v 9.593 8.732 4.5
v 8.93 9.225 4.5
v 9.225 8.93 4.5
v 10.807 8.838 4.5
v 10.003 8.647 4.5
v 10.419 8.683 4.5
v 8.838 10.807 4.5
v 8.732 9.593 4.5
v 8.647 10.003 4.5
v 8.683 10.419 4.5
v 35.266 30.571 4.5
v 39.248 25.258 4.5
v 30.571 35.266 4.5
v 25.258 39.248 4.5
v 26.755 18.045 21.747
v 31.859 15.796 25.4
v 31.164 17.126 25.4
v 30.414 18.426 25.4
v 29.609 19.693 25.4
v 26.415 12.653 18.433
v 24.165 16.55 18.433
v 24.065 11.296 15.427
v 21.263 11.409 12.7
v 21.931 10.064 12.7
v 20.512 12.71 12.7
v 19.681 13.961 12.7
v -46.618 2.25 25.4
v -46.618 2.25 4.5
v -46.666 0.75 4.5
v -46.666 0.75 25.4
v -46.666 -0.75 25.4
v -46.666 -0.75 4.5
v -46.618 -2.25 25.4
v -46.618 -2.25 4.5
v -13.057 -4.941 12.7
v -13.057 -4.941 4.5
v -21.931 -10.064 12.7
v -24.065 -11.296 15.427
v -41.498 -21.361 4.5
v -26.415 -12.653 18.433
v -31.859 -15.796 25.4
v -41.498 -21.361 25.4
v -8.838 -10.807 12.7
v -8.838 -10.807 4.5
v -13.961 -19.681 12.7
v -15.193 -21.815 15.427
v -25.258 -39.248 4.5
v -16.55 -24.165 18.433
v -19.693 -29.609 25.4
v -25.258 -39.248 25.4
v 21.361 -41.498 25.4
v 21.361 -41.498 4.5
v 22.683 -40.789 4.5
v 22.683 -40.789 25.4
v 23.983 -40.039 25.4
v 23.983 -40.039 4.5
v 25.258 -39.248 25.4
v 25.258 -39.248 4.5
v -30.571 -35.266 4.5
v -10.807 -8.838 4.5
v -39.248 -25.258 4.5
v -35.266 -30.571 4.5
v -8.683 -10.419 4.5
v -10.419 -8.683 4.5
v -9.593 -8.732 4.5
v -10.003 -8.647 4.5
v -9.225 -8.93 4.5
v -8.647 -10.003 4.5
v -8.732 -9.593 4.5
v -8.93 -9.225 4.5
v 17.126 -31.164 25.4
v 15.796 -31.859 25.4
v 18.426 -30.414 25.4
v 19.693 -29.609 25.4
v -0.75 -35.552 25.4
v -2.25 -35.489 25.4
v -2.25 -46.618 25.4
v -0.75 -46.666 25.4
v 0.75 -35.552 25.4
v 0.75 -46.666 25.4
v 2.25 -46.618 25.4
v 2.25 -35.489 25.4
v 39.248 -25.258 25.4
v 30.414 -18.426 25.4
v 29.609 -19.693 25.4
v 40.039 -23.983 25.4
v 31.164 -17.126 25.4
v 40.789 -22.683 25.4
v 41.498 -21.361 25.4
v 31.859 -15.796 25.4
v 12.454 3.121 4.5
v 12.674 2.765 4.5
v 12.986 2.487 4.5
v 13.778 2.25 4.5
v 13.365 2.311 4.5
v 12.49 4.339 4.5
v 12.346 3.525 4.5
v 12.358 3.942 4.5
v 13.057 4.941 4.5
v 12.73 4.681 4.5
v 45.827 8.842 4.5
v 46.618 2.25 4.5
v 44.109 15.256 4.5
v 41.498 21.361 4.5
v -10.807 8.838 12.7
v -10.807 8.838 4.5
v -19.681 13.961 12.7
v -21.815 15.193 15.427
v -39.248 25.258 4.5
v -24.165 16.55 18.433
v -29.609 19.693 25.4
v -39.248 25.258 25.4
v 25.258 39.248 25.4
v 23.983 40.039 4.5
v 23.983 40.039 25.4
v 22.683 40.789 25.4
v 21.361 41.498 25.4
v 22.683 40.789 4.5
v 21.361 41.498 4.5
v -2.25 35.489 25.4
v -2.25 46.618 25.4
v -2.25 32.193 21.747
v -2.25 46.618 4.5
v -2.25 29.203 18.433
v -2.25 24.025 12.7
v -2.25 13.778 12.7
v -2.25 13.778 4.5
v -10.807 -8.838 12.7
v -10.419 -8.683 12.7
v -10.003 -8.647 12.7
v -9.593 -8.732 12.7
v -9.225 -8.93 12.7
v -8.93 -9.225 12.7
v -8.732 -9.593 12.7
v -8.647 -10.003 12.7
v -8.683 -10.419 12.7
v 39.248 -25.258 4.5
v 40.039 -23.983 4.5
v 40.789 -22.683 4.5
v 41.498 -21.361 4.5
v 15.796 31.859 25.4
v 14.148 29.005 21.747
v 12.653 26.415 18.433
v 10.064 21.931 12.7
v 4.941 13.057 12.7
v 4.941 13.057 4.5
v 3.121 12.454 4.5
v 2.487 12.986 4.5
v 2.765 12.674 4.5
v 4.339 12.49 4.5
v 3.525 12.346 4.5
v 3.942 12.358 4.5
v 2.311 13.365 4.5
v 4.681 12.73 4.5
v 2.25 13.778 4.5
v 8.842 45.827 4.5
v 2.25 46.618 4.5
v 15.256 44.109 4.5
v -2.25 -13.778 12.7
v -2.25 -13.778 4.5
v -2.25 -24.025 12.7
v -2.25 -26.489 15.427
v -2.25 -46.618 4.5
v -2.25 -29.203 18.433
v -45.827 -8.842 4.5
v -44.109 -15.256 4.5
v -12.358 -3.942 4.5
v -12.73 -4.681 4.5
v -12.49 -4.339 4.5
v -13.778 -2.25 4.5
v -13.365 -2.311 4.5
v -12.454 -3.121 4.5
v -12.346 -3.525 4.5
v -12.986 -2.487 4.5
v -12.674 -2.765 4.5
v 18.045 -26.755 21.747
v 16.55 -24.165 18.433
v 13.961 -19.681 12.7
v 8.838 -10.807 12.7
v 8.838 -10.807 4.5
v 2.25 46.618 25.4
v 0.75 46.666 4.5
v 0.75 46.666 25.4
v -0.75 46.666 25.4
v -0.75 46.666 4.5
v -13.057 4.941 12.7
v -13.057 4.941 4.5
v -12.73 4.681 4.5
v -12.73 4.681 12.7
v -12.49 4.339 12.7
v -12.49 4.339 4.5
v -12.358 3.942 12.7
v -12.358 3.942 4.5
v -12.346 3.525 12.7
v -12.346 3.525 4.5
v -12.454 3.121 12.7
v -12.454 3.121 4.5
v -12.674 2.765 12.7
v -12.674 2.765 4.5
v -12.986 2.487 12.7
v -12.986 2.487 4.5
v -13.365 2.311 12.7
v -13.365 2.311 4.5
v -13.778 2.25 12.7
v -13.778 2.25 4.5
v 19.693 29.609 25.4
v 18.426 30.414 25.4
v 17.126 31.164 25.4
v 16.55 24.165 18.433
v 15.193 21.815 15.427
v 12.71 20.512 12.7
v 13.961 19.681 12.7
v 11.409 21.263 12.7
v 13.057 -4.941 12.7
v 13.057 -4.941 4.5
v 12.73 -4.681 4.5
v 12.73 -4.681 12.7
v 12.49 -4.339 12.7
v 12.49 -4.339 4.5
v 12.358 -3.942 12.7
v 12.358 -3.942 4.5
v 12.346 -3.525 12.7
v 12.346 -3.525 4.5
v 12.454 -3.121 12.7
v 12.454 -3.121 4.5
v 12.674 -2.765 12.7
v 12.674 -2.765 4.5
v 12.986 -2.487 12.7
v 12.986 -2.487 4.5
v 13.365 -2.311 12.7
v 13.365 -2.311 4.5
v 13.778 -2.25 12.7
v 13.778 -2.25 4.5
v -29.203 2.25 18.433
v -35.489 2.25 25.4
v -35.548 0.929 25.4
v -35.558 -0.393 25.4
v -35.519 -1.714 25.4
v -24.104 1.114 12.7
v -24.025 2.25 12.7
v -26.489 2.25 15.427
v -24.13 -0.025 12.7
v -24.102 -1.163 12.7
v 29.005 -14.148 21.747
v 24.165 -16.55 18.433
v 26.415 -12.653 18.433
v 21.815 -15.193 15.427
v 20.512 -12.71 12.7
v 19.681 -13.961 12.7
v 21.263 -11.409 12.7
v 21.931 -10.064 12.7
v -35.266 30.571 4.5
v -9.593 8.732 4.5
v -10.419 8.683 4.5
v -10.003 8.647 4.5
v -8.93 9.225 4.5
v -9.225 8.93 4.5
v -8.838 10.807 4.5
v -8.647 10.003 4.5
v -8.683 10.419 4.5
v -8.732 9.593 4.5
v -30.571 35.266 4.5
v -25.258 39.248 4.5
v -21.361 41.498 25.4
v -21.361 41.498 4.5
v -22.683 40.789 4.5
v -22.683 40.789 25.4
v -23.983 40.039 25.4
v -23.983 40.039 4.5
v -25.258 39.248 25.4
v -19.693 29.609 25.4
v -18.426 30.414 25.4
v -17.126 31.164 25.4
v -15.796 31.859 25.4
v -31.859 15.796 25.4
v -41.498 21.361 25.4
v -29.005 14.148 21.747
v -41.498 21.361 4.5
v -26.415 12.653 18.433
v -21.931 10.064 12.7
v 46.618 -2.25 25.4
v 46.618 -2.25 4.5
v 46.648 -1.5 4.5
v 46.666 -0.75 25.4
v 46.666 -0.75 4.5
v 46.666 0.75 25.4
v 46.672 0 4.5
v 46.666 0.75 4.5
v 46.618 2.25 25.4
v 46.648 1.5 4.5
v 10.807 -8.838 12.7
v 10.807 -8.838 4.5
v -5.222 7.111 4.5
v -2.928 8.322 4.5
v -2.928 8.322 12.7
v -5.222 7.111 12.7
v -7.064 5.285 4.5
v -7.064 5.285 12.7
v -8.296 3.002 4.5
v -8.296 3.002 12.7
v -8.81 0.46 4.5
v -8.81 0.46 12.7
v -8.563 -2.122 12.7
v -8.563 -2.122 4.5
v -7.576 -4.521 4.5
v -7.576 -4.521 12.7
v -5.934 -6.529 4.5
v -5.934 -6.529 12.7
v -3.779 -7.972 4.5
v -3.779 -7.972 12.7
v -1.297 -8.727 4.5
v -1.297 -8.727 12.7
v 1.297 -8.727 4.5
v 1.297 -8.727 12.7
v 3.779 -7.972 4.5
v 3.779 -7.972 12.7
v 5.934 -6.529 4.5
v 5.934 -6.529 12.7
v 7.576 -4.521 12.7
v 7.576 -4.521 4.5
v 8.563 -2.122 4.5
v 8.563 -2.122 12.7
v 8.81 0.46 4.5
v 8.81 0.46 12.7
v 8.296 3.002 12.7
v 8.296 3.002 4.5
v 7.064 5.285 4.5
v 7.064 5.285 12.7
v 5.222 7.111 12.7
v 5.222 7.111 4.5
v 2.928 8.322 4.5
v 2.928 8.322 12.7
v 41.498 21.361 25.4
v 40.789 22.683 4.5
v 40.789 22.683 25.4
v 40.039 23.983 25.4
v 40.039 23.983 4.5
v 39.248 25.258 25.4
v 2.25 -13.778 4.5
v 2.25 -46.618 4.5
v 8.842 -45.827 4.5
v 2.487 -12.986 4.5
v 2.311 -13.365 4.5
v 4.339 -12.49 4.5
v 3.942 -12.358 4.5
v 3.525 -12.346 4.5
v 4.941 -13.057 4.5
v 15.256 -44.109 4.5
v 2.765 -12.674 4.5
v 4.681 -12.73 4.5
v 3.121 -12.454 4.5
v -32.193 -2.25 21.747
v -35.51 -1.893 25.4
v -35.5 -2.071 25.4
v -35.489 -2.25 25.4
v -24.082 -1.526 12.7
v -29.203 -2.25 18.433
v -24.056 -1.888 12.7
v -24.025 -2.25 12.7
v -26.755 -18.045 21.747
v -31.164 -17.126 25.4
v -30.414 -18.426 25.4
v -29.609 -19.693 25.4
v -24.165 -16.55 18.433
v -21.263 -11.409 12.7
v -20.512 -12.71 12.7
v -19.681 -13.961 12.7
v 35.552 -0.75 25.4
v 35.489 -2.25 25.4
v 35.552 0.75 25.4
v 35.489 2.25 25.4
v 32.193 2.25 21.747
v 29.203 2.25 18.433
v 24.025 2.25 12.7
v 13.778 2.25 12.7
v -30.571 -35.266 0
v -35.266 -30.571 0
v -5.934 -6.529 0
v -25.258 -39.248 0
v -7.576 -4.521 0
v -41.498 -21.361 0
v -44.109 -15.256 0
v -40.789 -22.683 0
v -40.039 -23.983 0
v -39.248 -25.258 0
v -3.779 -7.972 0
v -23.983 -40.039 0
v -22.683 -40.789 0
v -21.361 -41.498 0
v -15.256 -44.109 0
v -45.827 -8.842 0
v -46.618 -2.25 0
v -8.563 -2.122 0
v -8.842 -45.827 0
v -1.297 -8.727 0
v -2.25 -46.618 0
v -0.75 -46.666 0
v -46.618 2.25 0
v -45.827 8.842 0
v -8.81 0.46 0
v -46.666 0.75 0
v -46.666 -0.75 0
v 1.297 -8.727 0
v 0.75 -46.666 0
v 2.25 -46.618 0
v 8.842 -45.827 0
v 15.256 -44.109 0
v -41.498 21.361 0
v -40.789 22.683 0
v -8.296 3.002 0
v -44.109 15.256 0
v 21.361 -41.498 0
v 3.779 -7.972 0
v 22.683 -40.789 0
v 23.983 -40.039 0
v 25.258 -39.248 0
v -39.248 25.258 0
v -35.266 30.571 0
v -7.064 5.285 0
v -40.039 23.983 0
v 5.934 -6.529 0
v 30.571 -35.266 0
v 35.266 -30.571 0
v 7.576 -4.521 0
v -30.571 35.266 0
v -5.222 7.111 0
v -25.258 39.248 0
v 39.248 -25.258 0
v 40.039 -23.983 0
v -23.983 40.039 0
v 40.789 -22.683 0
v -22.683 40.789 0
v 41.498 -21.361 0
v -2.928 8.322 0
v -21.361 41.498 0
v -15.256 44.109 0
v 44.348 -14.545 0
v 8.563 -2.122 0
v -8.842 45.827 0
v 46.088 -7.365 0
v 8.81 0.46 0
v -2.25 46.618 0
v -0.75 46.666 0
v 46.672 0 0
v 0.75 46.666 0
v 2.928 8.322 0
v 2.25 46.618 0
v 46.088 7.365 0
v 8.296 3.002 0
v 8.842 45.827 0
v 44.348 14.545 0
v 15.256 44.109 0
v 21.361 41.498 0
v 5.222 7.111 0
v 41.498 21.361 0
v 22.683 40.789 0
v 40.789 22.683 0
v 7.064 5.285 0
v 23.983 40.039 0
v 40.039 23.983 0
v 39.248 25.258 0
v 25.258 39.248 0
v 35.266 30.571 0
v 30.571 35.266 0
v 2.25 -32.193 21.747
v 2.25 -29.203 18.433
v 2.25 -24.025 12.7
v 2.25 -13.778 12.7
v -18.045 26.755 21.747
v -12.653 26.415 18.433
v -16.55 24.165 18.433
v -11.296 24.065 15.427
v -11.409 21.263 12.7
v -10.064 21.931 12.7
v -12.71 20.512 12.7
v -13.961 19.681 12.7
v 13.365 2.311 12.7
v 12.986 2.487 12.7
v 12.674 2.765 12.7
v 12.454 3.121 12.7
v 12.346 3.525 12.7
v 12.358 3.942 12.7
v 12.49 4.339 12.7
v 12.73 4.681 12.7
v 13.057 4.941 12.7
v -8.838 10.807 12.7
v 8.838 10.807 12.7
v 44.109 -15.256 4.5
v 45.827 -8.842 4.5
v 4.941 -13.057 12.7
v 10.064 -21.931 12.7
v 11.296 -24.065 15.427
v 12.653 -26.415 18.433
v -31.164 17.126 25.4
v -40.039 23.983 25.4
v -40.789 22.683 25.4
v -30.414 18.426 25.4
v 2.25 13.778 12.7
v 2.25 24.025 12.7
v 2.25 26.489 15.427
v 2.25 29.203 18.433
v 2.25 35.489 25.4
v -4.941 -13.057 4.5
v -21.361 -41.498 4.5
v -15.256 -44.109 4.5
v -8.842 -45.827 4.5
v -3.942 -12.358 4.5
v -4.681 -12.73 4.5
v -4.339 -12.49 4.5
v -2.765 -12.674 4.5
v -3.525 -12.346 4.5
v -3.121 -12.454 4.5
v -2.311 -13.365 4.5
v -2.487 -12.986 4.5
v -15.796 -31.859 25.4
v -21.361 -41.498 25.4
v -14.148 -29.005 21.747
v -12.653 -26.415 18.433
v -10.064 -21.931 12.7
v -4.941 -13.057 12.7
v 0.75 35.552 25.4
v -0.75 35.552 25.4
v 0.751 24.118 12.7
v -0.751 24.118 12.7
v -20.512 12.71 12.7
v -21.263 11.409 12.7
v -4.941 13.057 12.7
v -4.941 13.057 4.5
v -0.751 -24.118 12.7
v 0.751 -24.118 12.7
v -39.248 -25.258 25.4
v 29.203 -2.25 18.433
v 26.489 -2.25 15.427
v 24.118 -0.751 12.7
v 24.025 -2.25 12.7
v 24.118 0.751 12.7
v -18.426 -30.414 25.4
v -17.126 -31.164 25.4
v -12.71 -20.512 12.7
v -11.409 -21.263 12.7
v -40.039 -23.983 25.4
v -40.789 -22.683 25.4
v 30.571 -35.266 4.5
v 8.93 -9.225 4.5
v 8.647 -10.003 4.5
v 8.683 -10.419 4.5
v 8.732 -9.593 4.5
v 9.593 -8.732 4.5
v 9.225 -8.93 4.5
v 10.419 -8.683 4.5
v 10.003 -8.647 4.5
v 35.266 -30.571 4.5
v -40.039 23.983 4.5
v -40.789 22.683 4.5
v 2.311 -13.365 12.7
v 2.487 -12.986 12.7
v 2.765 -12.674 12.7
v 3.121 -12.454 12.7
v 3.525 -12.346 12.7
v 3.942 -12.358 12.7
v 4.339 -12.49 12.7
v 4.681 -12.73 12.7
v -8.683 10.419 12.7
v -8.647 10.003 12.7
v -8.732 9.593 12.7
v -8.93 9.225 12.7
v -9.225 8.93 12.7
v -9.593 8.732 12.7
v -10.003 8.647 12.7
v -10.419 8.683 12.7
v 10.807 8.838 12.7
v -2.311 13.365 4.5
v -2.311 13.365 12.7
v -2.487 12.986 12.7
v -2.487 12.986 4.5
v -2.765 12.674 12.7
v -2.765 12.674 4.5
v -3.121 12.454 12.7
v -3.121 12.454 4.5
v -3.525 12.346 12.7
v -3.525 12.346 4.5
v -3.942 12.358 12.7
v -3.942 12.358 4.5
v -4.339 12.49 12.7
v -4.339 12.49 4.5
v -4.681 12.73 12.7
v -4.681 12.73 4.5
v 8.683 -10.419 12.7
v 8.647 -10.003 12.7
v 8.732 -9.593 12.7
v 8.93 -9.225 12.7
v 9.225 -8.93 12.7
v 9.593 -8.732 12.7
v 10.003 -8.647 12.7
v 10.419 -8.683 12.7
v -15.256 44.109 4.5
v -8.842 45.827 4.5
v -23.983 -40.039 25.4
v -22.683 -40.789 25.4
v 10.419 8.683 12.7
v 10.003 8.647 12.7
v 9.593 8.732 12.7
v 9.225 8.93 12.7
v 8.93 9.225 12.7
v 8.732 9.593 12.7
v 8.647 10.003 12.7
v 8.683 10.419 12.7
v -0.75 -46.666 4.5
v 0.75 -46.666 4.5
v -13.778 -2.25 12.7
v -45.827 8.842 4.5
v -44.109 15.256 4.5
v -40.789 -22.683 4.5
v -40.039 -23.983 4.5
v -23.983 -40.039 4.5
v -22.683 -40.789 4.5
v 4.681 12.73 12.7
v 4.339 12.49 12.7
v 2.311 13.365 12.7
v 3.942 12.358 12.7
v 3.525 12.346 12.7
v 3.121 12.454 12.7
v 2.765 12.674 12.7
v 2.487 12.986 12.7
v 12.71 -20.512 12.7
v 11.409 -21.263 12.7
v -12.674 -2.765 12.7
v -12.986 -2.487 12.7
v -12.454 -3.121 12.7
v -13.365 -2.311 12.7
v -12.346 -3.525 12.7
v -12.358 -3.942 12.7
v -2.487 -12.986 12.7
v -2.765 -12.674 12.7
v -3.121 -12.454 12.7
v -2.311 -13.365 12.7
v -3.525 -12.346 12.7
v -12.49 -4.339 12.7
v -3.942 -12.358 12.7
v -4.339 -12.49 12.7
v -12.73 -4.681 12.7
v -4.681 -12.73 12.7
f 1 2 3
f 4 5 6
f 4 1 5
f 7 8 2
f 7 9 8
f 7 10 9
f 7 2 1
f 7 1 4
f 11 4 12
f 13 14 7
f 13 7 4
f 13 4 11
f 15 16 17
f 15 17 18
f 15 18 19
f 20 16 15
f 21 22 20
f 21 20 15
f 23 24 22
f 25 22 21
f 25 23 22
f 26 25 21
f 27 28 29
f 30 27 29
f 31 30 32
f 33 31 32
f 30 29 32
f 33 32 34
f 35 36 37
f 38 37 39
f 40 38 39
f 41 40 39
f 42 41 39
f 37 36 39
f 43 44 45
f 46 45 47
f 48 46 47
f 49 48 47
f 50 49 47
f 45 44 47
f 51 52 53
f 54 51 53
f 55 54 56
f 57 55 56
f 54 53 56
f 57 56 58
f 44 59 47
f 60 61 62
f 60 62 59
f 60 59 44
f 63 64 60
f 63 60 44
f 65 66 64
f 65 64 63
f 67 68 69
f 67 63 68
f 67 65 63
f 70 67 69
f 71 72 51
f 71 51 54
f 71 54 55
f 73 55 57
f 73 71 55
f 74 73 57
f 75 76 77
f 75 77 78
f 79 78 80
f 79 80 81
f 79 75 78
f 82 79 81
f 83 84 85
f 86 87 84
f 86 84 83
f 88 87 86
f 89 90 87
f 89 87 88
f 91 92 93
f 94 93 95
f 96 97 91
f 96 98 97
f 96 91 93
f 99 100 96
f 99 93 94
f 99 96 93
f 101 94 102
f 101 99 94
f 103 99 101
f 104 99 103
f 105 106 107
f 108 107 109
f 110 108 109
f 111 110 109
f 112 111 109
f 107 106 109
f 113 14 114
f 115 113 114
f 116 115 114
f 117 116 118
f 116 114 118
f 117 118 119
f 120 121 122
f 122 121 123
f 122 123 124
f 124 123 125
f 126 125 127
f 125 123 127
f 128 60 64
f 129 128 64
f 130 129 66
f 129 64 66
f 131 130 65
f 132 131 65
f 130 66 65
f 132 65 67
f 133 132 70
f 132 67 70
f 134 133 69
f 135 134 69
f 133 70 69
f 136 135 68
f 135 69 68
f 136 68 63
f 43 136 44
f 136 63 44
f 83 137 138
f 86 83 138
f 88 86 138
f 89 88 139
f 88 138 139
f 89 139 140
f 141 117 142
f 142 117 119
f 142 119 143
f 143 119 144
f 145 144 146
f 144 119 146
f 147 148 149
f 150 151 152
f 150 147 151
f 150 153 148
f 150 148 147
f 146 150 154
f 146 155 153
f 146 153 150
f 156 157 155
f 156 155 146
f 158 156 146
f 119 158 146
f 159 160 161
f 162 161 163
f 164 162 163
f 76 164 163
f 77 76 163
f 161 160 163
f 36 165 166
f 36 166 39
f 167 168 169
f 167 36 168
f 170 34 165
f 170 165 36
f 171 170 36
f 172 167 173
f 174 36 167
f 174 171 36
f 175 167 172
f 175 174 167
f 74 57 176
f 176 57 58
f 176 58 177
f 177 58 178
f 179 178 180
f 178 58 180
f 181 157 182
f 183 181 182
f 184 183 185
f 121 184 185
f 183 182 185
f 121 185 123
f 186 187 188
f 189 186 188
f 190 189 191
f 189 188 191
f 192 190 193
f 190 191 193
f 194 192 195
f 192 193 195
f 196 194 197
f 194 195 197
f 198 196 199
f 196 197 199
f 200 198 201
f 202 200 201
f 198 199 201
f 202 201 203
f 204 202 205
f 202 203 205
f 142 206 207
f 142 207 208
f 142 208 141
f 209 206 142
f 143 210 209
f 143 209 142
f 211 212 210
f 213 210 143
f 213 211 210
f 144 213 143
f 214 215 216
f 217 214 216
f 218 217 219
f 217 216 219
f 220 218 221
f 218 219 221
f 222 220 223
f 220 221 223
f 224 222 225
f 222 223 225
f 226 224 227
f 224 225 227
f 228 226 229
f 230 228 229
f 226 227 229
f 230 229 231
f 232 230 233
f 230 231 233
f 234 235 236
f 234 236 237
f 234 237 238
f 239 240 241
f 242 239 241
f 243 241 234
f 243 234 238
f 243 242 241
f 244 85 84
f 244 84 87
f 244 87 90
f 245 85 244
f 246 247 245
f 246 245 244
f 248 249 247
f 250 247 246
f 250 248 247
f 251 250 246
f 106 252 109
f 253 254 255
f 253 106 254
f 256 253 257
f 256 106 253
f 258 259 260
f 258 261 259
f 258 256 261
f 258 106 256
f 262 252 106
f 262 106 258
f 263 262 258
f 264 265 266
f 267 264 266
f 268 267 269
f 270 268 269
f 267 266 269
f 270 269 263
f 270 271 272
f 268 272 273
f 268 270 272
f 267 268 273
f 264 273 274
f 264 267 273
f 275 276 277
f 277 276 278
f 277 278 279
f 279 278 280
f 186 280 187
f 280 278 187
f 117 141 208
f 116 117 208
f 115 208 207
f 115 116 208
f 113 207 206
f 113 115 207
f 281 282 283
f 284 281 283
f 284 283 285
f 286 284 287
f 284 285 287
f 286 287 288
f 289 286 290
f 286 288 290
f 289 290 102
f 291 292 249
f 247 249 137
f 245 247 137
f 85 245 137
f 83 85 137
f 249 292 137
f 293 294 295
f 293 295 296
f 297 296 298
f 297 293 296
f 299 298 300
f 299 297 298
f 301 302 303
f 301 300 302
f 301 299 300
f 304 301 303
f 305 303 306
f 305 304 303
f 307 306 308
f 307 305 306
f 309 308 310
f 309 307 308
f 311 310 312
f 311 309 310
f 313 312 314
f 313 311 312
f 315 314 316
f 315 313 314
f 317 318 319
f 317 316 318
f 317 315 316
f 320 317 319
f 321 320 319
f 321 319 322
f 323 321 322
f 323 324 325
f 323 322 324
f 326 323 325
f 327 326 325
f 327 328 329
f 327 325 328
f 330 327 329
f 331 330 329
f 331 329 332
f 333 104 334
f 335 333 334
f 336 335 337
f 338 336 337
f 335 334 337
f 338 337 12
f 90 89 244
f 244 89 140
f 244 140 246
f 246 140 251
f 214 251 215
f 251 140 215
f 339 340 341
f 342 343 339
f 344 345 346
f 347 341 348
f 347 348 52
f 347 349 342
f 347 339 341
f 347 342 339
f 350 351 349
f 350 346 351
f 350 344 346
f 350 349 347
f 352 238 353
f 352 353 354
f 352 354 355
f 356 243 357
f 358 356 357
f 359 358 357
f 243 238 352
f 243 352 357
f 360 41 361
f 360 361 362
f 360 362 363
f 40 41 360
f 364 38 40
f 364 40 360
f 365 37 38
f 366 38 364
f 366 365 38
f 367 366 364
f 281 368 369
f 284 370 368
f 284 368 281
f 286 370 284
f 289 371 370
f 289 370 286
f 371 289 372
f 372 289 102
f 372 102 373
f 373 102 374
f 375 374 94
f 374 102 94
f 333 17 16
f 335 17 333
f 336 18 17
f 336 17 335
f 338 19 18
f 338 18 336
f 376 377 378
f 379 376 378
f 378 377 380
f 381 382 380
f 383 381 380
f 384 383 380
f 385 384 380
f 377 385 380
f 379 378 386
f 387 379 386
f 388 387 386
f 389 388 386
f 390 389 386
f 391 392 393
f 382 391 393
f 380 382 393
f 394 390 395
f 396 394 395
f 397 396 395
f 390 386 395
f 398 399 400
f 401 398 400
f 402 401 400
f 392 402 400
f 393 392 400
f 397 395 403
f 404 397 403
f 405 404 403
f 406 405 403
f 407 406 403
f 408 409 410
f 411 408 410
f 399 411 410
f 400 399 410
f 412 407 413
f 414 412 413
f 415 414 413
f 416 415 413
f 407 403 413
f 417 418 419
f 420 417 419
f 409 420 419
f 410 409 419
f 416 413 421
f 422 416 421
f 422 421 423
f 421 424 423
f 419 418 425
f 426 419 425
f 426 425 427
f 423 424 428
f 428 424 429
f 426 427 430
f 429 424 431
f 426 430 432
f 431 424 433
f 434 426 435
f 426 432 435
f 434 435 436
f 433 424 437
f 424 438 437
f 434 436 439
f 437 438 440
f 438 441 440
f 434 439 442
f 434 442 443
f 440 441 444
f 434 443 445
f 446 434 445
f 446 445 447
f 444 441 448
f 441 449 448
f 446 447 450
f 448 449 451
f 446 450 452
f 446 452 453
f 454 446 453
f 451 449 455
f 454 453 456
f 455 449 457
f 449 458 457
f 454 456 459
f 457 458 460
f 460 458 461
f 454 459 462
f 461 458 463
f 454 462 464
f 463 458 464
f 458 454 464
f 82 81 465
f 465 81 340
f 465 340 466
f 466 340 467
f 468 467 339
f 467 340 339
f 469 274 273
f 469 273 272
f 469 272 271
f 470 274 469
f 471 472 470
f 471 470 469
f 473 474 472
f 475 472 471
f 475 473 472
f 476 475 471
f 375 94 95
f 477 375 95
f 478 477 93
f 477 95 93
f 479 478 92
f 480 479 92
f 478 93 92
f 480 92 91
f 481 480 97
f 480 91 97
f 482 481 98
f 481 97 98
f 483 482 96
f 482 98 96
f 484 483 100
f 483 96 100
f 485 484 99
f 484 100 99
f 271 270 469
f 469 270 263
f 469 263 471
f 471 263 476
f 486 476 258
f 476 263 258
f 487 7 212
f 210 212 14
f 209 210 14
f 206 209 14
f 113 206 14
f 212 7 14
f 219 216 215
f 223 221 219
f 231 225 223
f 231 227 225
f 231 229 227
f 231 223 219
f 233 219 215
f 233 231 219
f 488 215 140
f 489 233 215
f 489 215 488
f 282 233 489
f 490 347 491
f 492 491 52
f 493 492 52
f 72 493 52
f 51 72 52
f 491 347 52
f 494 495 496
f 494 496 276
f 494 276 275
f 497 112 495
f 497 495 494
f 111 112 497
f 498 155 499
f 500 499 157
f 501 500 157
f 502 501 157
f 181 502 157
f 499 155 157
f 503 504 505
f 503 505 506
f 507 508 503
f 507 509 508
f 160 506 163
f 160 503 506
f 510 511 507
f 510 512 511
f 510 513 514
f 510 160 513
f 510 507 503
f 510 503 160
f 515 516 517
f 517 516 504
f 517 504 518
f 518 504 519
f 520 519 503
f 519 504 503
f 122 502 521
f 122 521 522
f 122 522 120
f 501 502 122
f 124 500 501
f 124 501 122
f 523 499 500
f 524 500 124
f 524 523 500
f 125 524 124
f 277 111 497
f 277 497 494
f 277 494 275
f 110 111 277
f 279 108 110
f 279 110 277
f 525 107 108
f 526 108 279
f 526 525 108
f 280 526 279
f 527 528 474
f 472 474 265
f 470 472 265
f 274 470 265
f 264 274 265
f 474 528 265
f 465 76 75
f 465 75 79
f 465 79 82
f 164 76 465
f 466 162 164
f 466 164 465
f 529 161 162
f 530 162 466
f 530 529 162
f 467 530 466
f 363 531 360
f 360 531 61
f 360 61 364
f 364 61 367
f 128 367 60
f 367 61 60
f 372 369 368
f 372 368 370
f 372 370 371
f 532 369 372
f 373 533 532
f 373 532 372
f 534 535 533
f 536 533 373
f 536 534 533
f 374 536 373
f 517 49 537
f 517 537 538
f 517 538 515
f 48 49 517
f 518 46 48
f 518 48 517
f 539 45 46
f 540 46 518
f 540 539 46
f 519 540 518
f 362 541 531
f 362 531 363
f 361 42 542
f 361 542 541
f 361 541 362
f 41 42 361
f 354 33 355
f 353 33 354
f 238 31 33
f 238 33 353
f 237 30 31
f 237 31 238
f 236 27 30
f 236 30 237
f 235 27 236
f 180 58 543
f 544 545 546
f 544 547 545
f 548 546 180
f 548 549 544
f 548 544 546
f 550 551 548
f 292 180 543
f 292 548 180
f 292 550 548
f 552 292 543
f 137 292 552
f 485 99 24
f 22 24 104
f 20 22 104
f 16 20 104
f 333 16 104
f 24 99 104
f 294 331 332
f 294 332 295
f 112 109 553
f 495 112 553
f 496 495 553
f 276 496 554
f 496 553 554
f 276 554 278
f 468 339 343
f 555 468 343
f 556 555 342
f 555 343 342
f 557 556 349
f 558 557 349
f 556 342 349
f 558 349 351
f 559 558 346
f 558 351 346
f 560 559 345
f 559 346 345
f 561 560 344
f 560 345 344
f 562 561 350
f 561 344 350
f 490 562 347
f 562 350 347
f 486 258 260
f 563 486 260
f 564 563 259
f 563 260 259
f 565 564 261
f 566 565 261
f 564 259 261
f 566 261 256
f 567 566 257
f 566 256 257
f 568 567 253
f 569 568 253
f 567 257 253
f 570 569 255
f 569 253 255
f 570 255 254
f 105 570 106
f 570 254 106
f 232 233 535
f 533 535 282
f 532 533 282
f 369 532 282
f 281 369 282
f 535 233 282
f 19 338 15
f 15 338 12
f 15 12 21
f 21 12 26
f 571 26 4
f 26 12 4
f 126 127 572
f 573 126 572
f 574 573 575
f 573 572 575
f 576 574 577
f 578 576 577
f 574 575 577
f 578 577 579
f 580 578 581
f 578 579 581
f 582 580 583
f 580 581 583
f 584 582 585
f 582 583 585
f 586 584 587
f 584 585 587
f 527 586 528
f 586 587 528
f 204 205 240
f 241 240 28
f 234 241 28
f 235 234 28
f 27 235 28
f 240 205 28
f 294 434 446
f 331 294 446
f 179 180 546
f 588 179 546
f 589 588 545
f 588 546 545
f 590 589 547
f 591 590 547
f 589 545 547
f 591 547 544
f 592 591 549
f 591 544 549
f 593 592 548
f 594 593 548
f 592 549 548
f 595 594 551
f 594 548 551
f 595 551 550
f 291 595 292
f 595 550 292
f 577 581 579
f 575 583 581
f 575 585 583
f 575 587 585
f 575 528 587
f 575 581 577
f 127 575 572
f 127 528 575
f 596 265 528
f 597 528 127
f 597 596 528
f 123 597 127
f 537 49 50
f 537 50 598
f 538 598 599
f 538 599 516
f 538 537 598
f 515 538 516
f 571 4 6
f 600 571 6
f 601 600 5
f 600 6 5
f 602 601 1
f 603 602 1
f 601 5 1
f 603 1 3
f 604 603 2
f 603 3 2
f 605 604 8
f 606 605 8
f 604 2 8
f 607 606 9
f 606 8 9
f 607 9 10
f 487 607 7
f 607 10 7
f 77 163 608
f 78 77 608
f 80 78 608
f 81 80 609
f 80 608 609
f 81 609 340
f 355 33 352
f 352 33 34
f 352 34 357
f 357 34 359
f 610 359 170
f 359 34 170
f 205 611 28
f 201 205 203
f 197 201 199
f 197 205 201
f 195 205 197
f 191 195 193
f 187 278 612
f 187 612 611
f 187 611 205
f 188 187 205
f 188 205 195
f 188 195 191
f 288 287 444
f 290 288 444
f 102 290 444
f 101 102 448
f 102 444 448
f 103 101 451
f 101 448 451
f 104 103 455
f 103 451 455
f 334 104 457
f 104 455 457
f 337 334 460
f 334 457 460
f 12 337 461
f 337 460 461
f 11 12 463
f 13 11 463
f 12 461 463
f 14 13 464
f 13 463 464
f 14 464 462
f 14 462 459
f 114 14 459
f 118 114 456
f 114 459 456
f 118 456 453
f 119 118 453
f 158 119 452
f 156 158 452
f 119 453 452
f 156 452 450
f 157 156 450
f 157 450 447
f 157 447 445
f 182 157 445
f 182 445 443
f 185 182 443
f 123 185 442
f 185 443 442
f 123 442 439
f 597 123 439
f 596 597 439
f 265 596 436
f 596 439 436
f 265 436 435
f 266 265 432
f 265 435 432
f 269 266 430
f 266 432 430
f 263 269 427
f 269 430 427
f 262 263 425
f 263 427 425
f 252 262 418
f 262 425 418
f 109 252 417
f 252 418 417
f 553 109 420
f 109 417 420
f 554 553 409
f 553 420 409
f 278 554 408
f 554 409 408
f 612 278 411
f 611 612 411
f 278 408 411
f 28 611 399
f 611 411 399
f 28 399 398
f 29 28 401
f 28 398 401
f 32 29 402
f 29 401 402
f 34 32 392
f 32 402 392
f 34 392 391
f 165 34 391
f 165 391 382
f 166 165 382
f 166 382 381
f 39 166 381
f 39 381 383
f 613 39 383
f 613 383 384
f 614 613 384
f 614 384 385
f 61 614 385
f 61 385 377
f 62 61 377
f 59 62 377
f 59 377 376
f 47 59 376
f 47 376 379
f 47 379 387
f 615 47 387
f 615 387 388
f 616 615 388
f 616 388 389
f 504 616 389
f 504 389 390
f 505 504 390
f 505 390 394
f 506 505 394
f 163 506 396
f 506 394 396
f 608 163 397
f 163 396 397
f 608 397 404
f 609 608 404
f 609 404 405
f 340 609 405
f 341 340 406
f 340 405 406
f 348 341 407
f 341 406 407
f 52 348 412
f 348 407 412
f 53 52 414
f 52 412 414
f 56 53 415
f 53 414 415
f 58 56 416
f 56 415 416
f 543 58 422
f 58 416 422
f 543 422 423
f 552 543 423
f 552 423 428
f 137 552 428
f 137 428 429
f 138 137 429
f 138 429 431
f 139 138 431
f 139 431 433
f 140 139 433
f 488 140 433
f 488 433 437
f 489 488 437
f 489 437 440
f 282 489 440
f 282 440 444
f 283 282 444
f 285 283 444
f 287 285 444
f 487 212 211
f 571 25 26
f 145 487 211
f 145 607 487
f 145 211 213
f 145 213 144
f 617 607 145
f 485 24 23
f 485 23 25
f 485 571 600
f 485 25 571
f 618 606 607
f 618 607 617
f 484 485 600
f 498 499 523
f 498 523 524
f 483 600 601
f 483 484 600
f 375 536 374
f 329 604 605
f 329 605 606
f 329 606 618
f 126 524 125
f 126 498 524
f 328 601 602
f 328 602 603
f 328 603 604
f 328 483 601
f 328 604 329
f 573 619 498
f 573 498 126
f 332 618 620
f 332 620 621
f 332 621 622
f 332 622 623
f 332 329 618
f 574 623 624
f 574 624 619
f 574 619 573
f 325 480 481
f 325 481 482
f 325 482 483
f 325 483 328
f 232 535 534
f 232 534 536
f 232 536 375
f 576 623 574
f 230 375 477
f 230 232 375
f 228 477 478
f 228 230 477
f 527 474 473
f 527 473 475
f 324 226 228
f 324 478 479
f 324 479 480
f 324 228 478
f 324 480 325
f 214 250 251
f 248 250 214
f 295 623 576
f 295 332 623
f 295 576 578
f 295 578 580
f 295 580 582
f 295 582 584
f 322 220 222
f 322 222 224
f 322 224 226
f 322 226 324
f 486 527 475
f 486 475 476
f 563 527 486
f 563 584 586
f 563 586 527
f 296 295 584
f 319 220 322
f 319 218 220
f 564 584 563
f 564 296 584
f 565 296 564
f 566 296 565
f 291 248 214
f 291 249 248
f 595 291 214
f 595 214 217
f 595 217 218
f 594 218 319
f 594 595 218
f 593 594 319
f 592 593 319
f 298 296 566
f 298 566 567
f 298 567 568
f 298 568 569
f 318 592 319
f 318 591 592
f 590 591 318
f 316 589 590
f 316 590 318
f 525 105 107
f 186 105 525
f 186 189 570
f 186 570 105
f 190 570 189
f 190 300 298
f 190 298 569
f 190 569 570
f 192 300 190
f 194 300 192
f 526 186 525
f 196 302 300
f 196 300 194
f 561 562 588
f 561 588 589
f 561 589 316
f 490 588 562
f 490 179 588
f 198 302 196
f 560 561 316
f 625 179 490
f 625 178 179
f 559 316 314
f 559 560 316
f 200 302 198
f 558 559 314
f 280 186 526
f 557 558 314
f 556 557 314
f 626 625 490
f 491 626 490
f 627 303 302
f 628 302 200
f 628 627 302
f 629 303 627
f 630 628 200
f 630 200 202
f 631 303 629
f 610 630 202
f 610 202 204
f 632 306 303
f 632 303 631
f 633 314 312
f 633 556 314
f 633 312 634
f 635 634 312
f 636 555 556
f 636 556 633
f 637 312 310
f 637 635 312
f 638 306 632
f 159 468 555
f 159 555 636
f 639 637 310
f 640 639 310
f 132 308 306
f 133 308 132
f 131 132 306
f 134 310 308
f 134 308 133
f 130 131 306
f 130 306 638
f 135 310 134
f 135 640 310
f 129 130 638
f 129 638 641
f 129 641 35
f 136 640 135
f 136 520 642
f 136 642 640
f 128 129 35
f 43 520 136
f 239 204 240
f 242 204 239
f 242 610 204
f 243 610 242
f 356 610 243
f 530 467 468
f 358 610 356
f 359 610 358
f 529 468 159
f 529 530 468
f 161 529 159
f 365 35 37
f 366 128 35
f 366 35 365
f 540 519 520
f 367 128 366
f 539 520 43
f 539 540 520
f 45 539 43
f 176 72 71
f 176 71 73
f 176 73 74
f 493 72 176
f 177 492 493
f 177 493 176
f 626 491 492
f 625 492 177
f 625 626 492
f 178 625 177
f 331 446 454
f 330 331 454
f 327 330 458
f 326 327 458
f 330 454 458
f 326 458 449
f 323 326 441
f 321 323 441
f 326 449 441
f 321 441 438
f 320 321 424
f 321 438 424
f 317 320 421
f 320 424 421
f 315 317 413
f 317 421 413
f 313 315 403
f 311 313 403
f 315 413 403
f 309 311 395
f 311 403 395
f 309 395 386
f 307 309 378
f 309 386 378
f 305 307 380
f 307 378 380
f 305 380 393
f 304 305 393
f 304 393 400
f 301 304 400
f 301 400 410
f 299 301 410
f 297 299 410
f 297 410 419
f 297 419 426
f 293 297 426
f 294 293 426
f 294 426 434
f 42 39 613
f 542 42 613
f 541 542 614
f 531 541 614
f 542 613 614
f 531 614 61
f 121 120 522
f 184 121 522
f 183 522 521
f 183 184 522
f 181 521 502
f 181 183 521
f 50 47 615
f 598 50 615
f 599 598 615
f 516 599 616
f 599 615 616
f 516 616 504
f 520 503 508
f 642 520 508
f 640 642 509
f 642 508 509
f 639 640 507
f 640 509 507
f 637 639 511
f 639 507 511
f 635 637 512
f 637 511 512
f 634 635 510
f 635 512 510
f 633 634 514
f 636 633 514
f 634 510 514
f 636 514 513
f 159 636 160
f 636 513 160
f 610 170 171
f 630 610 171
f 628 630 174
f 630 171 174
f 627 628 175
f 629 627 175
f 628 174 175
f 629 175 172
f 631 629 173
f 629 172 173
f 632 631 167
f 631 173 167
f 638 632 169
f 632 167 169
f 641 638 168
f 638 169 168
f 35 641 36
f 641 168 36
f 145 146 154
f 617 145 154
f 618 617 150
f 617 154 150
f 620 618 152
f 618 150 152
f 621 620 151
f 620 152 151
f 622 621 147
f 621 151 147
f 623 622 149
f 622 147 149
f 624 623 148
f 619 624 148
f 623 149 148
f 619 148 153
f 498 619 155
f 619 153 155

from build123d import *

# Parameters (mm, degrees)
SKETCH1_R           = 46.6725
BOSS_EXTRUDE1_DEPTH = 4.5
BOSS_EXTRUDE2_START = -4.5
BOSS_EXTRUDE2_DEPTH = 25.4


with BuildPart() as part:
    # Sketch1 → Boss-Extrude1 (new body)
    with BuildSketch(Plane.XY):
        Circle(SKETCH1_R)
        with BuildLine():
            Line((-2.927883194, 8.3225), (2.927883194, 8.3225))
            ThreePointArc((2.927883194, 8.3225), (0, -8.8225), (-2.927883194, 8.3225))
        make_face(mode=Mode.SUBTRACT)
    extrude(amount=BOSS_EXTRUDE1_DEPTH)

    # Sketch2 → Boss-Extrude2 (add)
    with BuildSketch(Plane.XY.offset(4.5).offset(BOSS_EXTRUDE2_START)):
        with BuildLine():
            Line((-2.25, 46.618234161), (-2.25, 13.778350254))
            ThreePointArc((-2.25, 13.778350254), (-3.318707206, 12.385583908), (-4.940617969, 13.057401343))
            Line((-4.940617969, 13.057401343), (-21.360559922, 41.497575063))
            ThreePointArc((-21.360559922, 41.497575063), (-23.33625, 40.419570658), (-25.257674239, 39.247575063))
            Line((-25.257674239, 39.247575063), (-8.837732286, 10.807401343))
            ThreePointArc((-8.837732286, 10.807401343), (-9.066876702, 9.066876702), (-10.807401343, 8.837732286))
            Line((-10.807401343, 8.837732286), (-39.247575063, 25.257674239))
            ThreePointArc((-39.247575063, 25.257674239), (-40.419570658, 23.33625), (-41.497575063, 21.360559922))
            Line((-41.497575063, 21.360559922), (-13.057401343, 4.940617969))
            ThreePointArc((-13.057401343, 4.940617969), (-12.385583908, 3.318707206), (-13.778350254, 2.25))
            Line((-13.778350254, 2.25), (-46.618234161, 2.25))
            ThreePointArc((-46.618234161, 2.25), (-46.6725, 0), (-46.618234161, -2.25))
            Line((-46.618234161, -2.25), (-13.778350254, -2.25))
            ThreePointArc((-13.778350254, -2.25), (-12.385583908, -3.318707206), (-13.057401343, -4.940617969))
            Line((-13.057401343, -4.940617969), (-41.497575063, -21.360559922))
            ThreePointArc((-41.497575063, -21.360559922), (-40.419570658, -23.33625), (-39.247575063, -25.257674239))
            Line((-39.247575063, -25.257674239), (-10.807401343, -8.837732286))
            ThreePointArc((-10.807401343, -8.837732286), (-9.066876702, -9.066876702), (-8.837732286, -10.807401343))
            Line((-8.837732286, -10.807401343), (-25.257674239, -39.247575063))
            ThreePointArc((-25.257674239, -39.247575063), (-23.33625, -40.419570658), (-21.360559922, -41.497575063))
            Line((-21.360559922, -41.497575063), (-4.940617969, -13.057401343))
            ThreePointArc((-4.940617969, -13.057401343), (-3.318707206, -12.385583908), (-2.25, -13.778350254))
            Line((-2.25, -13.778350254), (-2.25, -46.618234161))
            ThreePointArc((-2.25, -46.618234161), (0, -46.6725), (2.25, -46.618234161))
            Line((2.25, -46.618234161), (2.25, -13.778350254))
            ThreePointArc((2.25, -13.778350254), (3.318707206, -12.385583908), (4.940617969, -13.057401343))
            Line((4.940617969, -13.057401343), (21.360559922, -41.497575063))
            ThreePointArc((21.360559922, -41.497575063), (23.33625, -40.419570658), (25.257674239, -39.247575063))
            Line((25.257674239, -39.247575063), (8.837732286, -10.807401343))
            ThreePointArc((8.837732286, -10.807401343), (9.066876702, -9.066876702), (10.807401343, -8.837732286))
            Line((10.807401343, -8.837732286), (39.247575063, -25.257674239))
            ThreePointArc((39.247575063, -25.257674239), (40.419570658, -23.33625), (41.497575063, -21.360559922))
            Line((41.497575063, -21.360559922), (13.057401343, -4.940617969))
            ThreePointArc((13.057401343, -4.940617969), (12.385583908, -3.318707206), (13.778350254, -2.25))
            Line((13.778350254, -2.25), (46.618234161, -2.25))
            ThreePointArc((46.618234161, -2.25), (46.6725, 0), (46.618234161, 2.25))
            Line((46.618234161, 2.25), (13.778350254, 2.25))
            ThreePointArc((13.778350254, 2.25), (12.385583908, 3.318707206), (13.057401343, 4.940617969))
            Line((13.057401343, 4.940617969), (41.497575063, 21.360559922))
            ThreePointArc((41.497575063, 21.360559922), (40.419570658, 23.33625), (39.247575063, 25.257674239))
            Line((39.247575063, 25.257674239), (10.807401343, 8.837732286))
            ThreePointArc((10.807401343, 8.837732286), (9.066876702, 9.066876702), (8.837732286, 10.807401343))
            Line((8.837732286, 10.807401343), (25.257674239, 39.247575063))
            ThreePointArc((25.257674239, 39.247575063), (23.33625, 40.419570658), (21.360559922, 41.497575063))
            Line((21.360559922, 41.497575063), (4.940617969, 13.057401343))
            ThreePointArc((4.940617969, 13.057401343), (3.318707206, 12.385583908), (2.25, 13.778350254))
            Line((2.25, 13.778350254), (2.25, 46.618234161))
            ThreePointArc((2.25, 46.618234161), (0, 46.6725), (-2.25, 46.618234161))
        make_face()
        with BuildLine():
            Line((2.927883194, 8.3225), (-2.927883194, 8.3225))
            ThreePointArc((-2.927883194, 8.3225), (0, -8.8225), (2.927883194, 8.3225))
        make_face(mode=Mode.SUBTRACT)
    extrude(amount=BOSS_EXTRUDE2_DEPTH)

    # Sketch3 → Cut-Revolve1 (revolve, cut)
    with BuildSketch(Plane(origin=(0, 0, 0), x_dir=(1, 0, 0), z_dir=(0, 1, 0)), mode=Mode.PRIVATE) as cut_revolve1_sk:
        Polygon((-24.13, -12.7), (-6.35, -12.7), (-6.35, -25.4), (-35.56, -25.4), align=None)
    revolve(cut_revolve1_sk.sketch.rotate(Axis((0, 0, 0), (0, 0, 1)), 2.76320082), axis=Axis((0, 0, 0), (0, 0, 1)), mode=Mode.SUBTRACT)


solid = part.part
